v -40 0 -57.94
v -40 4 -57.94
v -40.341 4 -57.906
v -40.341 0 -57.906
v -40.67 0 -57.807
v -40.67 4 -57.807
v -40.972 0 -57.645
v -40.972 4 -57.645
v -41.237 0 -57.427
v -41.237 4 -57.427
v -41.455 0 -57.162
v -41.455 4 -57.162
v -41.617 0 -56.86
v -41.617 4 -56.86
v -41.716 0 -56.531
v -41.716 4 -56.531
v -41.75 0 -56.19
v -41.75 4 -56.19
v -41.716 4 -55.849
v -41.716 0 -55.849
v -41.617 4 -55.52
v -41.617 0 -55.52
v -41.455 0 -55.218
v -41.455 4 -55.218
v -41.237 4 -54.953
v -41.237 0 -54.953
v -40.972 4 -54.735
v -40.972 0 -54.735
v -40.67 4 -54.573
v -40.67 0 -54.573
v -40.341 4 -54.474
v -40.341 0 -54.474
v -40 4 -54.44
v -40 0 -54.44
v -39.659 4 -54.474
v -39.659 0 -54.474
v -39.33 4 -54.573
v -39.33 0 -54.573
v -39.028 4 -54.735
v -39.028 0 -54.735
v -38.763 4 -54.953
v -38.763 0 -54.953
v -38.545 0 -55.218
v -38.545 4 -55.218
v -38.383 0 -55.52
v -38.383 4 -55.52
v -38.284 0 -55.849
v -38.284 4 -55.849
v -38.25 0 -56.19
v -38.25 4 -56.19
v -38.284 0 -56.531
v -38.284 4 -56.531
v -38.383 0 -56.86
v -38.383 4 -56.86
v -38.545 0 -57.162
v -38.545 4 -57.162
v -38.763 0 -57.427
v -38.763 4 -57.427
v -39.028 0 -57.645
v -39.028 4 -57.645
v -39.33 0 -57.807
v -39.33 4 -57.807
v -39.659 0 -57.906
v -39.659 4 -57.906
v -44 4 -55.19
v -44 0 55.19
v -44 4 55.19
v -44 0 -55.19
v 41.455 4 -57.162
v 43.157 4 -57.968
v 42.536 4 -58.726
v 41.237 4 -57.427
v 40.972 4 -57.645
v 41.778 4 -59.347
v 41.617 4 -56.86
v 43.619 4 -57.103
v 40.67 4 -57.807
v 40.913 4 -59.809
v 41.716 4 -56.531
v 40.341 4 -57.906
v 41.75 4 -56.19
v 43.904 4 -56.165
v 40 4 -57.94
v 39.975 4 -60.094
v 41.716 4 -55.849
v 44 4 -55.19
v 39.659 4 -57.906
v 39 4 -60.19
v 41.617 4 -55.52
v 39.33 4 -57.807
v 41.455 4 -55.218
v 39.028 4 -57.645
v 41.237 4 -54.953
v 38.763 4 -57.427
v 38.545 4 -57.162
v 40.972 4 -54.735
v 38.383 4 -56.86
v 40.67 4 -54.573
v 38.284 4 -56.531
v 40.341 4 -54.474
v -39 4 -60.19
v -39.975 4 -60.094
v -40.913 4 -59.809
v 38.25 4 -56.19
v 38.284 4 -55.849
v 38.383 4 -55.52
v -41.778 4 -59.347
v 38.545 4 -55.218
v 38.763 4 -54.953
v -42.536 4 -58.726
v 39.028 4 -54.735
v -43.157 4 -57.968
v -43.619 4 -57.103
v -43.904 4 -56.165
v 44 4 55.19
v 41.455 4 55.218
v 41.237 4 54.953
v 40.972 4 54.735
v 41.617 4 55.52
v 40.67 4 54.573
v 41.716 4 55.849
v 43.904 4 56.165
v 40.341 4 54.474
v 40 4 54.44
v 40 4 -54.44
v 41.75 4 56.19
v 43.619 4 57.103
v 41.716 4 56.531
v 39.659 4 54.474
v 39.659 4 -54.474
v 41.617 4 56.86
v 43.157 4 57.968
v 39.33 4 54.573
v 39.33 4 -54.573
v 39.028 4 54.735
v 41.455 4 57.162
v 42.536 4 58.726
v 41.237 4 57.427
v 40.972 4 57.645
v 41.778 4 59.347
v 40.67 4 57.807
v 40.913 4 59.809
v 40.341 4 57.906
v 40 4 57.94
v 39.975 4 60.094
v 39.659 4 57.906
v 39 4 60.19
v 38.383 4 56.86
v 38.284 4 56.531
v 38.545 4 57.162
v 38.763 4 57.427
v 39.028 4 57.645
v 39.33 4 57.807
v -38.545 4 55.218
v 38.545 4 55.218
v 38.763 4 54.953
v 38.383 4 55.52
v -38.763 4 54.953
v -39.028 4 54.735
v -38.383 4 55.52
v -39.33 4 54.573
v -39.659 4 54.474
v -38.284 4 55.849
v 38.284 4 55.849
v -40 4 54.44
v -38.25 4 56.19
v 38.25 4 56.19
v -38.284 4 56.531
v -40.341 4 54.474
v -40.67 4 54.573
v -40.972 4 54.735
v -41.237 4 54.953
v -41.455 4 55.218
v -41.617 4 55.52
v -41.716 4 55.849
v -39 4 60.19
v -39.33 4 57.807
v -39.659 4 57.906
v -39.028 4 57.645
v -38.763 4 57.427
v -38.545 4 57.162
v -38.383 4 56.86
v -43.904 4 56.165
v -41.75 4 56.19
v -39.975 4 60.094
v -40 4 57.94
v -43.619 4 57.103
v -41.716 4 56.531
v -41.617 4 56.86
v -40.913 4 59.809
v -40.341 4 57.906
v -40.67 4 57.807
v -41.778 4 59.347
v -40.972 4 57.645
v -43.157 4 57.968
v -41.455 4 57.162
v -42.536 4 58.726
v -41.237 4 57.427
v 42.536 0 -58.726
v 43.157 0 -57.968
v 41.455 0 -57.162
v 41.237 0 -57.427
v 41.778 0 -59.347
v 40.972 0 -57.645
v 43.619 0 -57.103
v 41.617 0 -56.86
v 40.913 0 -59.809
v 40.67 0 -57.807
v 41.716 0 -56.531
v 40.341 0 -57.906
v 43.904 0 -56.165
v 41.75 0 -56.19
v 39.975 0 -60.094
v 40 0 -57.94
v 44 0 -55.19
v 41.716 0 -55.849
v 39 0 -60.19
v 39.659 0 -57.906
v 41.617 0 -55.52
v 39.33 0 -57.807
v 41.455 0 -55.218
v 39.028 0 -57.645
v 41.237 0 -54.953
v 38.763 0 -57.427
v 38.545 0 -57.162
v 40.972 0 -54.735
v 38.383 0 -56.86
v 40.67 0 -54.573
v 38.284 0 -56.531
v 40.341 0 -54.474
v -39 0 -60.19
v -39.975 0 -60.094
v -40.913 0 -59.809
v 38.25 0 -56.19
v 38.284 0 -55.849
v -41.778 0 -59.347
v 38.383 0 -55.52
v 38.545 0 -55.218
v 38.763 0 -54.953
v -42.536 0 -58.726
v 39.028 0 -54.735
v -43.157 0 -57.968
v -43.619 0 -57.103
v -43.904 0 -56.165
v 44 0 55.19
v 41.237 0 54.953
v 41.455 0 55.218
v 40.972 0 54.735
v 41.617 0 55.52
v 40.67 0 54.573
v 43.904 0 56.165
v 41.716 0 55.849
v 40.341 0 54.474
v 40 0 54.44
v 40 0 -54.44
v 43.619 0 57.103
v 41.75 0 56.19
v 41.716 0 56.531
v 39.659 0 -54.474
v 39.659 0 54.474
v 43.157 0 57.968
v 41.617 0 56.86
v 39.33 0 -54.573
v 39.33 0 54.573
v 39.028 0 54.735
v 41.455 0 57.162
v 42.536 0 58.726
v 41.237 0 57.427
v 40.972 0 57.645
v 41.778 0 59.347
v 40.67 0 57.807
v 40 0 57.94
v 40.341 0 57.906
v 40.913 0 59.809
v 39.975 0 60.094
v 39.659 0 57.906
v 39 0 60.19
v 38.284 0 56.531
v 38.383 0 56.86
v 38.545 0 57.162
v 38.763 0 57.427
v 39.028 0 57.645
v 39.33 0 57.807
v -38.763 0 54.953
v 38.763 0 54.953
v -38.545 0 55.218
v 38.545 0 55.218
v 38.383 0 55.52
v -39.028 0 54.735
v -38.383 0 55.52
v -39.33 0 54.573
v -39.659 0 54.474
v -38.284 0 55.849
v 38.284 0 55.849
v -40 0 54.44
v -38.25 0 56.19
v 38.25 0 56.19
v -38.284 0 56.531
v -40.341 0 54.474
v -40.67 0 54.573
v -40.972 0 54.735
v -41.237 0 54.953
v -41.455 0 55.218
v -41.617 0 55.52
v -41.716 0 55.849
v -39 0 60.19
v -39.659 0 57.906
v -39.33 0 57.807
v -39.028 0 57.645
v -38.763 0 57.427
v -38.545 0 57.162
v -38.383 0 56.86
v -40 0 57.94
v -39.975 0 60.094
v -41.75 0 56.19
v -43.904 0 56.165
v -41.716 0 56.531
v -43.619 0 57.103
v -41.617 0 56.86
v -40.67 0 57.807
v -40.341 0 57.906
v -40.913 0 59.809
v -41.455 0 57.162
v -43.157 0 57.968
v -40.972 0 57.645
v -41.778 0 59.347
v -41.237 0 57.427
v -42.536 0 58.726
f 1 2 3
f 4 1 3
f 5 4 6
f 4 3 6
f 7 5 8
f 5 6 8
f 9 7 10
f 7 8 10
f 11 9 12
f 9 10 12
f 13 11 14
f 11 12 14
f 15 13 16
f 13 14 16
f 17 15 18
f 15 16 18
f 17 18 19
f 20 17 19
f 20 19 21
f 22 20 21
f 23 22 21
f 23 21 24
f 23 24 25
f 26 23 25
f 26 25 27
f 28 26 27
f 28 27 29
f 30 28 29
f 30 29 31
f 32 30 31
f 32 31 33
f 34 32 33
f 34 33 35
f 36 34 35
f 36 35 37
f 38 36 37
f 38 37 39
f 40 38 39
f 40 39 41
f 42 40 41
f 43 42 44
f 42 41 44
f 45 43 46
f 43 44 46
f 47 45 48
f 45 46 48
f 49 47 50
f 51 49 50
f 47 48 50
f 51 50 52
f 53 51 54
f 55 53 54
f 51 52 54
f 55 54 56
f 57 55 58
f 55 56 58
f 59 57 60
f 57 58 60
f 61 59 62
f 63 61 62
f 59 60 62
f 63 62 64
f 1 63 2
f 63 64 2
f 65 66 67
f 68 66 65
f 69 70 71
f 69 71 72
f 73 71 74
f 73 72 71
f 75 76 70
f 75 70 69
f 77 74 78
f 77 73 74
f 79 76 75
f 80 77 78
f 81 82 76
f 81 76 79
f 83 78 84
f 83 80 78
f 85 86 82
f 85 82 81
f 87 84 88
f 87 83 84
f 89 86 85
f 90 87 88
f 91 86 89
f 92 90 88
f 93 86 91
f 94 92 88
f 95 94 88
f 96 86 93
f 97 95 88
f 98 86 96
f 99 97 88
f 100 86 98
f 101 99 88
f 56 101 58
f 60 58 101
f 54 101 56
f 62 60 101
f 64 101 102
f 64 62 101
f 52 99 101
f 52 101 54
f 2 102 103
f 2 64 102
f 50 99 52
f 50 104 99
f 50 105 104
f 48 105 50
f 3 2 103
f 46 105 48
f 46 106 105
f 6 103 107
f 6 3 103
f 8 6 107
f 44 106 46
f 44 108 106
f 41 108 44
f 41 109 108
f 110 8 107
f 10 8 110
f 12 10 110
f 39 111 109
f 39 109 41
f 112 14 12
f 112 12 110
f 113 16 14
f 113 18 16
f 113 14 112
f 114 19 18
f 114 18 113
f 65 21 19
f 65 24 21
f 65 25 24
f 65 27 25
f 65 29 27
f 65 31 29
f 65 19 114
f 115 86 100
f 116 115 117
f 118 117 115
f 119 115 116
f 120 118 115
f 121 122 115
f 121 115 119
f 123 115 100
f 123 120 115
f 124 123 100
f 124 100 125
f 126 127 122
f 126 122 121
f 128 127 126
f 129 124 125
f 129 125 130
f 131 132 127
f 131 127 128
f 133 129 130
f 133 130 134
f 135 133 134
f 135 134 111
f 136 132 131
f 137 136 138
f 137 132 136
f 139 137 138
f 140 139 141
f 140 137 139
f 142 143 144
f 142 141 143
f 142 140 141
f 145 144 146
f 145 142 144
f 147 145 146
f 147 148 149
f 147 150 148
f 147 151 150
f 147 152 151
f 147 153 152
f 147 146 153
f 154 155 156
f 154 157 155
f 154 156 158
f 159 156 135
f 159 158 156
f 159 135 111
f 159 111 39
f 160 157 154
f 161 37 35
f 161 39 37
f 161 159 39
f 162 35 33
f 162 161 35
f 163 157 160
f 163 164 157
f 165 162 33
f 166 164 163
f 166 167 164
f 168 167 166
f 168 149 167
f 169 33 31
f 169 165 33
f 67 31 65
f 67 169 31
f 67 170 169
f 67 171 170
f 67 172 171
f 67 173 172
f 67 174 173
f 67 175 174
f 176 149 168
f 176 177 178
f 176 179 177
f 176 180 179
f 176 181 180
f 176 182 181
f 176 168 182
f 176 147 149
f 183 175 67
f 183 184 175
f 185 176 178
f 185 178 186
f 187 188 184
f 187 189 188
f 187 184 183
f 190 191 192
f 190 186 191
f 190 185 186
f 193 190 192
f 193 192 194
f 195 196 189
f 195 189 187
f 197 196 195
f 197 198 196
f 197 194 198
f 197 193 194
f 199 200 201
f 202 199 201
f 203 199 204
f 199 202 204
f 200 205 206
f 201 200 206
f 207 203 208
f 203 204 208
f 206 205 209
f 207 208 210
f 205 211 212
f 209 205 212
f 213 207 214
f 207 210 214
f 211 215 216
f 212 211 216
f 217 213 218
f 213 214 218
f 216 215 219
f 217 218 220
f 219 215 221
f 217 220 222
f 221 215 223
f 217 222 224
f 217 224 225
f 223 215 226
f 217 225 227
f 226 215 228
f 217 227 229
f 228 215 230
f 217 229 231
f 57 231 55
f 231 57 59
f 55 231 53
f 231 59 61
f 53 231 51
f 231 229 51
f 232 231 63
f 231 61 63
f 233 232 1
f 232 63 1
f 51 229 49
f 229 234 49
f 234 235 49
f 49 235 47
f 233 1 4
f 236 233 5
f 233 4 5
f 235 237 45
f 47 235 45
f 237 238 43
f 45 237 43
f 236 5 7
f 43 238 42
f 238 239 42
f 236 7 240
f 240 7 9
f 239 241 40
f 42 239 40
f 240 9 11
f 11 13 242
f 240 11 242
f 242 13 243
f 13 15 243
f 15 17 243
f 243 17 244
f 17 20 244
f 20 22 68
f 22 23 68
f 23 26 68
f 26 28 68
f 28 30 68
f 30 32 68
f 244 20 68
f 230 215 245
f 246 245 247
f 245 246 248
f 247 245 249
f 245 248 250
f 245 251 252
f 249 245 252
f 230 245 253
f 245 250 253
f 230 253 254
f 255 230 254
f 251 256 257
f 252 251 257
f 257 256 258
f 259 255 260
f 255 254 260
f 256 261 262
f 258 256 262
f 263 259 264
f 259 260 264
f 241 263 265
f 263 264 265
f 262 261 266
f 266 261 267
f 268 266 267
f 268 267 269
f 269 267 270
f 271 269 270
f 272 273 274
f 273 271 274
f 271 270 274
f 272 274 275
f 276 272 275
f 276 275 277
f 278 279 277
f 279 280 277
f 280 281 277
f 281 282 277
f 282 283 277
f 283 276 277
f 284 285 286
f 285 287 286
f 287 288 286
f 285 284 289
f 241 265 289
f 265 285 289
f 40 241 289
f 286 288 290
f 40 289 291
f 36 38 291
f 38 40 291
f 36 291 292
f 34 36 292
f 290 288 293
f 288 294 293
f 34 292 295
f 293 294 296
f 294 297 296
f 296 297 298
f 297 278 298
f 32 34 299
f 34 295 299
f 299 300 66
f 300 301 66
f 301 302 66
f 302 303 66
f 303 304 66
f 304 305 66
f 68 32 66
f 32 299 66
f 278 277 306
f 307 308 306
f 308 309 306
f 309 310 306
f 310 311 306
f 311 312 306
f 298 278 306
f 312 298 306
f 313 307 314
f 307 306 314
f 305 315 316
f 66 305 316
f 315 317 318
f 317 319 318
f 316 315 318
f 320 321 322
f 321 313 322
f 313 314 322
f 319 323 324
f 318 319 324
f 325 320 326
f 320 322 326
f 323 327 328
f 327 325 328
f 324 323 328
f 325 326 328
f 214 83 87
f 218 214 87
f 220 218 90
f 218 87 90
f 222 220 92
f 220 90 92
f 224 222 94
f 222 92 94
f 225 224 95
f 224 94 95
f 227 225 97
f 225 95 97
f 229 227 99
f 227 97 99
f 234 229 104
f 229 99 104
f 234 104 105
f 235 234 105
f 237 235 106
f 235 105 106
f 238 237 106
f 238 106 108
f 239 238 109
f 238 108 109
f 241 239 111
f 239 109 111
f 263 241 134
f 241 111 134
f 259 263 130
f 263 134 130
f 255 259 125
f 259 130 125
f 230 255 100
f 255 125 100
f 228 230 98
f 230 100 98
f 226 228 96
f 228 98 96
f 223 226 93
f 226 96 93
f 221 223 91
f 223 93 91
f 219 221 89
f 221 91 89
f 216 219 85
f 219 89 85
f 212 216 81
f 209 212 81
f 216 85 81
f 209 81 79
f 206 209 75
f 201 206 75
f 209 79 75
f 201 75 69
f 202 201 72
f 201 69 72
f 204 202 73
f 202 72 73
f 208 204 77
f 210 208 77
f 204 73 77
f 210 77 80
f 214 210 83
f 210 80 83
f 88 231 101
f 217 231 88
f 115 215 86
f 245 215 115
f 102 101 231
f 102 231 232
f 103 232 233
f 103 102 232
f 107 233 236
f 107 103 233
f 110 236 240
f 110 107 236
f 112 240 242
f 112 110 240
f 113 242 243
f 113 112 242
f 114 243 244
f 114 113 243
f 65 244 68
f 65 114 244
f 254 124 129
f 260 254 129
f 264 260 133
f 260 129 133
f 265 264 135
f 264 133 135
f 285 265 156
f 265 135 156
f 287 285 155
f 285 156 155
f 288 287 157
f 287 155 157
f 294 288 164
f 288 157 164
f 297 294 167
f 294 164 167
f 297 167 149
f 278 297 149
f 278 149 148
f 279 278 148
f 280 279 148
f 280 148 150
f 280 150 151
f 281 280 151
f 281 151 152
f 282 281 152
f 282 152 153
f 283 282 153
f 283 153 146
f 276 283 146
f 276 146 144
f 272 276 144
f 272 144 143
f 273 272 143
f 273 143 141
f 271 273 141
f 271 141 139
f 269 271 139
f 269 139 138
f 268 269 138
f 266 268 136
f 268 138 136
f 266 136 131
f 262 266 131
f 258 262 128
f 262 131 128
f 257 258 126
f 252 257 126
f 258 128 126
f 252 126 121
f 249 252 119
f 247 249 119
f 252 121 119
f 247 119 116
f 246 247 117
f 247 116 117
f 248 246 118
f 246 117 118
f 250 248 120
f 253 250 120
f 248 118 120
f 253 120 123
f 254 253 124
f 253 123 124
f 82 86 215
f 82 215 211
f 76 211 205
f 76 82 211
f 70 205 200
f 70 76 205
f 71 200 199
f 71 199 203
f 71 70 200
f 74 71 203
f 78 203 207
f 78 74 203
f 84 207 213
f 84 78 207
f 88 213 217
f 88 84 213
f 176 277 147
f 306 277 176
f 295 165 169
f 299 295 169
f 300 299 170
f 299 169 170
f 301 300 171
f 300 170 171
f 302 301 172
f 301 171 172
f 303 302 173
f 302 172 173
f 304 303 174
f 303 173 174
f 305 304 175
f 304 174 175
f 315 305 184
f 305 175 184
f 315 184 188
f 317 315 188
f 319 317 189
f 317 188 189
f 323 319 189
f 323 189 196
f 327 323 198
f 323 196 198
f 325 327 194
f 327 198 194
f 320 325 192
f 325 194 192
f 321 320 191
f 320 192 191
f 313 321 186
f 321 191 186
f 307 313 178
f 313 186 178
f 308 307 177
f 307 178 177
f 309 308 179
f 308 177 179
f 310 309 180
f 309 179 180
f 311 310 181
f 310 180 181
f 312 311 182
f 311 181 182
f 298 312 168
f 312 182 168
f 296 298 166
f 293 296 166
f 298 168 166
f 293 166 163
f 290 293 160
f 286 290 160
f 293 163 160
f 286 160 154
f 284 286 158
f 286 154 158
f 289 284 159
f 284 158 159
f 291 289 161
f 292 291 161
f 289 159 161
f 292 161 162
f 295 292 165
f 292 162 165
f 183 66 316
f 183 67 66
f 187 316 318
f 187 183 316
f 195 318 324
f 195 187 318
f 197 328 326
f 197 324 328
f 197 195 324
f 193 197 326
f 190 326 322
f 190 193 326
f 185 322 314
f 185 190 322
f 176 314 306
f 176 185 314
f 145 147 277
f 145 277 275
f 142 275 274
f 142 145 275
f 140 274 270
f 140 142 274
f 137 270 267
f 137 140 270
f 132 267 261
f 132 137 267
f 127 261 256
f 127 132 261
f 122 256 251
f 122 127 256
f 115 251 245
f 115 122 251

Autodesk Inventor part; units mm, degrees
ref_plane "YZ Plane" through (0, 0, 0) normal (1, 0, 0) x (0, 1, 0)
ref_plane "XZ Plane" through (0, 0, 0) normal (0, 1, 0) x (-1, 0, 0)
ref_plane "XY Plane" through (0, 0, 0) normal (0, 0, 1) x (1, 0, 0)
sketch "草图1" plane through (0, 0, 0) normal (0, 1, 0) x (-1, 0, 0)
  line L0 (-44, 60.19) -> (44, 60.19)
  line L1 (44, 60.19) -> (44, -60.19)
  line L2 (44, -60.19) -> (-44, -60.19)
  line L3 (-44, -60.19) -> (-44, 60.19)
  line L4 (-44, 60.19) -> (44, -60.19) construction
  line L5 (44, 60.19) -> (-44, -60.19) construction
  line L6 (0, 60.19) -> (0, -60.19)
  line L7 (44, 0) -> (-44, 0)
  point P0 (0, 0)
  point P1 (40, 56.19)
  point P2 (40, -56.19)
  point P3 (-40, 56.19)
  point P4 (-40, -56.19)
  dimension "d0" = 88
  dimension "d1" = 120.38
  dimension "d2" = 4
  dimension "d3" = 4
extrude "拉伸1" add sketch "草图1" along normal blind 4
hole "孔1" at (-40, 0, 56.19) at (-40, 0, -56.19) at (40, 0, 56.19) at (40, 0, -56.19) direction (0, 1, 0) diameter 3.5 end through all
fillet "面圆角1" radius 5 1 edges at (44, 2, 60.19)
fillet "面圆角2" radius 5 1 edges at (-44, 2, 60.19)
fillet "面圆角3" radius 5 1 edges at (44, 2, -60.19)
fillet "面圆角4" radius 5 1 edges at (-44, 2, -60.19)
properties part number "PrismGCUpNew"
